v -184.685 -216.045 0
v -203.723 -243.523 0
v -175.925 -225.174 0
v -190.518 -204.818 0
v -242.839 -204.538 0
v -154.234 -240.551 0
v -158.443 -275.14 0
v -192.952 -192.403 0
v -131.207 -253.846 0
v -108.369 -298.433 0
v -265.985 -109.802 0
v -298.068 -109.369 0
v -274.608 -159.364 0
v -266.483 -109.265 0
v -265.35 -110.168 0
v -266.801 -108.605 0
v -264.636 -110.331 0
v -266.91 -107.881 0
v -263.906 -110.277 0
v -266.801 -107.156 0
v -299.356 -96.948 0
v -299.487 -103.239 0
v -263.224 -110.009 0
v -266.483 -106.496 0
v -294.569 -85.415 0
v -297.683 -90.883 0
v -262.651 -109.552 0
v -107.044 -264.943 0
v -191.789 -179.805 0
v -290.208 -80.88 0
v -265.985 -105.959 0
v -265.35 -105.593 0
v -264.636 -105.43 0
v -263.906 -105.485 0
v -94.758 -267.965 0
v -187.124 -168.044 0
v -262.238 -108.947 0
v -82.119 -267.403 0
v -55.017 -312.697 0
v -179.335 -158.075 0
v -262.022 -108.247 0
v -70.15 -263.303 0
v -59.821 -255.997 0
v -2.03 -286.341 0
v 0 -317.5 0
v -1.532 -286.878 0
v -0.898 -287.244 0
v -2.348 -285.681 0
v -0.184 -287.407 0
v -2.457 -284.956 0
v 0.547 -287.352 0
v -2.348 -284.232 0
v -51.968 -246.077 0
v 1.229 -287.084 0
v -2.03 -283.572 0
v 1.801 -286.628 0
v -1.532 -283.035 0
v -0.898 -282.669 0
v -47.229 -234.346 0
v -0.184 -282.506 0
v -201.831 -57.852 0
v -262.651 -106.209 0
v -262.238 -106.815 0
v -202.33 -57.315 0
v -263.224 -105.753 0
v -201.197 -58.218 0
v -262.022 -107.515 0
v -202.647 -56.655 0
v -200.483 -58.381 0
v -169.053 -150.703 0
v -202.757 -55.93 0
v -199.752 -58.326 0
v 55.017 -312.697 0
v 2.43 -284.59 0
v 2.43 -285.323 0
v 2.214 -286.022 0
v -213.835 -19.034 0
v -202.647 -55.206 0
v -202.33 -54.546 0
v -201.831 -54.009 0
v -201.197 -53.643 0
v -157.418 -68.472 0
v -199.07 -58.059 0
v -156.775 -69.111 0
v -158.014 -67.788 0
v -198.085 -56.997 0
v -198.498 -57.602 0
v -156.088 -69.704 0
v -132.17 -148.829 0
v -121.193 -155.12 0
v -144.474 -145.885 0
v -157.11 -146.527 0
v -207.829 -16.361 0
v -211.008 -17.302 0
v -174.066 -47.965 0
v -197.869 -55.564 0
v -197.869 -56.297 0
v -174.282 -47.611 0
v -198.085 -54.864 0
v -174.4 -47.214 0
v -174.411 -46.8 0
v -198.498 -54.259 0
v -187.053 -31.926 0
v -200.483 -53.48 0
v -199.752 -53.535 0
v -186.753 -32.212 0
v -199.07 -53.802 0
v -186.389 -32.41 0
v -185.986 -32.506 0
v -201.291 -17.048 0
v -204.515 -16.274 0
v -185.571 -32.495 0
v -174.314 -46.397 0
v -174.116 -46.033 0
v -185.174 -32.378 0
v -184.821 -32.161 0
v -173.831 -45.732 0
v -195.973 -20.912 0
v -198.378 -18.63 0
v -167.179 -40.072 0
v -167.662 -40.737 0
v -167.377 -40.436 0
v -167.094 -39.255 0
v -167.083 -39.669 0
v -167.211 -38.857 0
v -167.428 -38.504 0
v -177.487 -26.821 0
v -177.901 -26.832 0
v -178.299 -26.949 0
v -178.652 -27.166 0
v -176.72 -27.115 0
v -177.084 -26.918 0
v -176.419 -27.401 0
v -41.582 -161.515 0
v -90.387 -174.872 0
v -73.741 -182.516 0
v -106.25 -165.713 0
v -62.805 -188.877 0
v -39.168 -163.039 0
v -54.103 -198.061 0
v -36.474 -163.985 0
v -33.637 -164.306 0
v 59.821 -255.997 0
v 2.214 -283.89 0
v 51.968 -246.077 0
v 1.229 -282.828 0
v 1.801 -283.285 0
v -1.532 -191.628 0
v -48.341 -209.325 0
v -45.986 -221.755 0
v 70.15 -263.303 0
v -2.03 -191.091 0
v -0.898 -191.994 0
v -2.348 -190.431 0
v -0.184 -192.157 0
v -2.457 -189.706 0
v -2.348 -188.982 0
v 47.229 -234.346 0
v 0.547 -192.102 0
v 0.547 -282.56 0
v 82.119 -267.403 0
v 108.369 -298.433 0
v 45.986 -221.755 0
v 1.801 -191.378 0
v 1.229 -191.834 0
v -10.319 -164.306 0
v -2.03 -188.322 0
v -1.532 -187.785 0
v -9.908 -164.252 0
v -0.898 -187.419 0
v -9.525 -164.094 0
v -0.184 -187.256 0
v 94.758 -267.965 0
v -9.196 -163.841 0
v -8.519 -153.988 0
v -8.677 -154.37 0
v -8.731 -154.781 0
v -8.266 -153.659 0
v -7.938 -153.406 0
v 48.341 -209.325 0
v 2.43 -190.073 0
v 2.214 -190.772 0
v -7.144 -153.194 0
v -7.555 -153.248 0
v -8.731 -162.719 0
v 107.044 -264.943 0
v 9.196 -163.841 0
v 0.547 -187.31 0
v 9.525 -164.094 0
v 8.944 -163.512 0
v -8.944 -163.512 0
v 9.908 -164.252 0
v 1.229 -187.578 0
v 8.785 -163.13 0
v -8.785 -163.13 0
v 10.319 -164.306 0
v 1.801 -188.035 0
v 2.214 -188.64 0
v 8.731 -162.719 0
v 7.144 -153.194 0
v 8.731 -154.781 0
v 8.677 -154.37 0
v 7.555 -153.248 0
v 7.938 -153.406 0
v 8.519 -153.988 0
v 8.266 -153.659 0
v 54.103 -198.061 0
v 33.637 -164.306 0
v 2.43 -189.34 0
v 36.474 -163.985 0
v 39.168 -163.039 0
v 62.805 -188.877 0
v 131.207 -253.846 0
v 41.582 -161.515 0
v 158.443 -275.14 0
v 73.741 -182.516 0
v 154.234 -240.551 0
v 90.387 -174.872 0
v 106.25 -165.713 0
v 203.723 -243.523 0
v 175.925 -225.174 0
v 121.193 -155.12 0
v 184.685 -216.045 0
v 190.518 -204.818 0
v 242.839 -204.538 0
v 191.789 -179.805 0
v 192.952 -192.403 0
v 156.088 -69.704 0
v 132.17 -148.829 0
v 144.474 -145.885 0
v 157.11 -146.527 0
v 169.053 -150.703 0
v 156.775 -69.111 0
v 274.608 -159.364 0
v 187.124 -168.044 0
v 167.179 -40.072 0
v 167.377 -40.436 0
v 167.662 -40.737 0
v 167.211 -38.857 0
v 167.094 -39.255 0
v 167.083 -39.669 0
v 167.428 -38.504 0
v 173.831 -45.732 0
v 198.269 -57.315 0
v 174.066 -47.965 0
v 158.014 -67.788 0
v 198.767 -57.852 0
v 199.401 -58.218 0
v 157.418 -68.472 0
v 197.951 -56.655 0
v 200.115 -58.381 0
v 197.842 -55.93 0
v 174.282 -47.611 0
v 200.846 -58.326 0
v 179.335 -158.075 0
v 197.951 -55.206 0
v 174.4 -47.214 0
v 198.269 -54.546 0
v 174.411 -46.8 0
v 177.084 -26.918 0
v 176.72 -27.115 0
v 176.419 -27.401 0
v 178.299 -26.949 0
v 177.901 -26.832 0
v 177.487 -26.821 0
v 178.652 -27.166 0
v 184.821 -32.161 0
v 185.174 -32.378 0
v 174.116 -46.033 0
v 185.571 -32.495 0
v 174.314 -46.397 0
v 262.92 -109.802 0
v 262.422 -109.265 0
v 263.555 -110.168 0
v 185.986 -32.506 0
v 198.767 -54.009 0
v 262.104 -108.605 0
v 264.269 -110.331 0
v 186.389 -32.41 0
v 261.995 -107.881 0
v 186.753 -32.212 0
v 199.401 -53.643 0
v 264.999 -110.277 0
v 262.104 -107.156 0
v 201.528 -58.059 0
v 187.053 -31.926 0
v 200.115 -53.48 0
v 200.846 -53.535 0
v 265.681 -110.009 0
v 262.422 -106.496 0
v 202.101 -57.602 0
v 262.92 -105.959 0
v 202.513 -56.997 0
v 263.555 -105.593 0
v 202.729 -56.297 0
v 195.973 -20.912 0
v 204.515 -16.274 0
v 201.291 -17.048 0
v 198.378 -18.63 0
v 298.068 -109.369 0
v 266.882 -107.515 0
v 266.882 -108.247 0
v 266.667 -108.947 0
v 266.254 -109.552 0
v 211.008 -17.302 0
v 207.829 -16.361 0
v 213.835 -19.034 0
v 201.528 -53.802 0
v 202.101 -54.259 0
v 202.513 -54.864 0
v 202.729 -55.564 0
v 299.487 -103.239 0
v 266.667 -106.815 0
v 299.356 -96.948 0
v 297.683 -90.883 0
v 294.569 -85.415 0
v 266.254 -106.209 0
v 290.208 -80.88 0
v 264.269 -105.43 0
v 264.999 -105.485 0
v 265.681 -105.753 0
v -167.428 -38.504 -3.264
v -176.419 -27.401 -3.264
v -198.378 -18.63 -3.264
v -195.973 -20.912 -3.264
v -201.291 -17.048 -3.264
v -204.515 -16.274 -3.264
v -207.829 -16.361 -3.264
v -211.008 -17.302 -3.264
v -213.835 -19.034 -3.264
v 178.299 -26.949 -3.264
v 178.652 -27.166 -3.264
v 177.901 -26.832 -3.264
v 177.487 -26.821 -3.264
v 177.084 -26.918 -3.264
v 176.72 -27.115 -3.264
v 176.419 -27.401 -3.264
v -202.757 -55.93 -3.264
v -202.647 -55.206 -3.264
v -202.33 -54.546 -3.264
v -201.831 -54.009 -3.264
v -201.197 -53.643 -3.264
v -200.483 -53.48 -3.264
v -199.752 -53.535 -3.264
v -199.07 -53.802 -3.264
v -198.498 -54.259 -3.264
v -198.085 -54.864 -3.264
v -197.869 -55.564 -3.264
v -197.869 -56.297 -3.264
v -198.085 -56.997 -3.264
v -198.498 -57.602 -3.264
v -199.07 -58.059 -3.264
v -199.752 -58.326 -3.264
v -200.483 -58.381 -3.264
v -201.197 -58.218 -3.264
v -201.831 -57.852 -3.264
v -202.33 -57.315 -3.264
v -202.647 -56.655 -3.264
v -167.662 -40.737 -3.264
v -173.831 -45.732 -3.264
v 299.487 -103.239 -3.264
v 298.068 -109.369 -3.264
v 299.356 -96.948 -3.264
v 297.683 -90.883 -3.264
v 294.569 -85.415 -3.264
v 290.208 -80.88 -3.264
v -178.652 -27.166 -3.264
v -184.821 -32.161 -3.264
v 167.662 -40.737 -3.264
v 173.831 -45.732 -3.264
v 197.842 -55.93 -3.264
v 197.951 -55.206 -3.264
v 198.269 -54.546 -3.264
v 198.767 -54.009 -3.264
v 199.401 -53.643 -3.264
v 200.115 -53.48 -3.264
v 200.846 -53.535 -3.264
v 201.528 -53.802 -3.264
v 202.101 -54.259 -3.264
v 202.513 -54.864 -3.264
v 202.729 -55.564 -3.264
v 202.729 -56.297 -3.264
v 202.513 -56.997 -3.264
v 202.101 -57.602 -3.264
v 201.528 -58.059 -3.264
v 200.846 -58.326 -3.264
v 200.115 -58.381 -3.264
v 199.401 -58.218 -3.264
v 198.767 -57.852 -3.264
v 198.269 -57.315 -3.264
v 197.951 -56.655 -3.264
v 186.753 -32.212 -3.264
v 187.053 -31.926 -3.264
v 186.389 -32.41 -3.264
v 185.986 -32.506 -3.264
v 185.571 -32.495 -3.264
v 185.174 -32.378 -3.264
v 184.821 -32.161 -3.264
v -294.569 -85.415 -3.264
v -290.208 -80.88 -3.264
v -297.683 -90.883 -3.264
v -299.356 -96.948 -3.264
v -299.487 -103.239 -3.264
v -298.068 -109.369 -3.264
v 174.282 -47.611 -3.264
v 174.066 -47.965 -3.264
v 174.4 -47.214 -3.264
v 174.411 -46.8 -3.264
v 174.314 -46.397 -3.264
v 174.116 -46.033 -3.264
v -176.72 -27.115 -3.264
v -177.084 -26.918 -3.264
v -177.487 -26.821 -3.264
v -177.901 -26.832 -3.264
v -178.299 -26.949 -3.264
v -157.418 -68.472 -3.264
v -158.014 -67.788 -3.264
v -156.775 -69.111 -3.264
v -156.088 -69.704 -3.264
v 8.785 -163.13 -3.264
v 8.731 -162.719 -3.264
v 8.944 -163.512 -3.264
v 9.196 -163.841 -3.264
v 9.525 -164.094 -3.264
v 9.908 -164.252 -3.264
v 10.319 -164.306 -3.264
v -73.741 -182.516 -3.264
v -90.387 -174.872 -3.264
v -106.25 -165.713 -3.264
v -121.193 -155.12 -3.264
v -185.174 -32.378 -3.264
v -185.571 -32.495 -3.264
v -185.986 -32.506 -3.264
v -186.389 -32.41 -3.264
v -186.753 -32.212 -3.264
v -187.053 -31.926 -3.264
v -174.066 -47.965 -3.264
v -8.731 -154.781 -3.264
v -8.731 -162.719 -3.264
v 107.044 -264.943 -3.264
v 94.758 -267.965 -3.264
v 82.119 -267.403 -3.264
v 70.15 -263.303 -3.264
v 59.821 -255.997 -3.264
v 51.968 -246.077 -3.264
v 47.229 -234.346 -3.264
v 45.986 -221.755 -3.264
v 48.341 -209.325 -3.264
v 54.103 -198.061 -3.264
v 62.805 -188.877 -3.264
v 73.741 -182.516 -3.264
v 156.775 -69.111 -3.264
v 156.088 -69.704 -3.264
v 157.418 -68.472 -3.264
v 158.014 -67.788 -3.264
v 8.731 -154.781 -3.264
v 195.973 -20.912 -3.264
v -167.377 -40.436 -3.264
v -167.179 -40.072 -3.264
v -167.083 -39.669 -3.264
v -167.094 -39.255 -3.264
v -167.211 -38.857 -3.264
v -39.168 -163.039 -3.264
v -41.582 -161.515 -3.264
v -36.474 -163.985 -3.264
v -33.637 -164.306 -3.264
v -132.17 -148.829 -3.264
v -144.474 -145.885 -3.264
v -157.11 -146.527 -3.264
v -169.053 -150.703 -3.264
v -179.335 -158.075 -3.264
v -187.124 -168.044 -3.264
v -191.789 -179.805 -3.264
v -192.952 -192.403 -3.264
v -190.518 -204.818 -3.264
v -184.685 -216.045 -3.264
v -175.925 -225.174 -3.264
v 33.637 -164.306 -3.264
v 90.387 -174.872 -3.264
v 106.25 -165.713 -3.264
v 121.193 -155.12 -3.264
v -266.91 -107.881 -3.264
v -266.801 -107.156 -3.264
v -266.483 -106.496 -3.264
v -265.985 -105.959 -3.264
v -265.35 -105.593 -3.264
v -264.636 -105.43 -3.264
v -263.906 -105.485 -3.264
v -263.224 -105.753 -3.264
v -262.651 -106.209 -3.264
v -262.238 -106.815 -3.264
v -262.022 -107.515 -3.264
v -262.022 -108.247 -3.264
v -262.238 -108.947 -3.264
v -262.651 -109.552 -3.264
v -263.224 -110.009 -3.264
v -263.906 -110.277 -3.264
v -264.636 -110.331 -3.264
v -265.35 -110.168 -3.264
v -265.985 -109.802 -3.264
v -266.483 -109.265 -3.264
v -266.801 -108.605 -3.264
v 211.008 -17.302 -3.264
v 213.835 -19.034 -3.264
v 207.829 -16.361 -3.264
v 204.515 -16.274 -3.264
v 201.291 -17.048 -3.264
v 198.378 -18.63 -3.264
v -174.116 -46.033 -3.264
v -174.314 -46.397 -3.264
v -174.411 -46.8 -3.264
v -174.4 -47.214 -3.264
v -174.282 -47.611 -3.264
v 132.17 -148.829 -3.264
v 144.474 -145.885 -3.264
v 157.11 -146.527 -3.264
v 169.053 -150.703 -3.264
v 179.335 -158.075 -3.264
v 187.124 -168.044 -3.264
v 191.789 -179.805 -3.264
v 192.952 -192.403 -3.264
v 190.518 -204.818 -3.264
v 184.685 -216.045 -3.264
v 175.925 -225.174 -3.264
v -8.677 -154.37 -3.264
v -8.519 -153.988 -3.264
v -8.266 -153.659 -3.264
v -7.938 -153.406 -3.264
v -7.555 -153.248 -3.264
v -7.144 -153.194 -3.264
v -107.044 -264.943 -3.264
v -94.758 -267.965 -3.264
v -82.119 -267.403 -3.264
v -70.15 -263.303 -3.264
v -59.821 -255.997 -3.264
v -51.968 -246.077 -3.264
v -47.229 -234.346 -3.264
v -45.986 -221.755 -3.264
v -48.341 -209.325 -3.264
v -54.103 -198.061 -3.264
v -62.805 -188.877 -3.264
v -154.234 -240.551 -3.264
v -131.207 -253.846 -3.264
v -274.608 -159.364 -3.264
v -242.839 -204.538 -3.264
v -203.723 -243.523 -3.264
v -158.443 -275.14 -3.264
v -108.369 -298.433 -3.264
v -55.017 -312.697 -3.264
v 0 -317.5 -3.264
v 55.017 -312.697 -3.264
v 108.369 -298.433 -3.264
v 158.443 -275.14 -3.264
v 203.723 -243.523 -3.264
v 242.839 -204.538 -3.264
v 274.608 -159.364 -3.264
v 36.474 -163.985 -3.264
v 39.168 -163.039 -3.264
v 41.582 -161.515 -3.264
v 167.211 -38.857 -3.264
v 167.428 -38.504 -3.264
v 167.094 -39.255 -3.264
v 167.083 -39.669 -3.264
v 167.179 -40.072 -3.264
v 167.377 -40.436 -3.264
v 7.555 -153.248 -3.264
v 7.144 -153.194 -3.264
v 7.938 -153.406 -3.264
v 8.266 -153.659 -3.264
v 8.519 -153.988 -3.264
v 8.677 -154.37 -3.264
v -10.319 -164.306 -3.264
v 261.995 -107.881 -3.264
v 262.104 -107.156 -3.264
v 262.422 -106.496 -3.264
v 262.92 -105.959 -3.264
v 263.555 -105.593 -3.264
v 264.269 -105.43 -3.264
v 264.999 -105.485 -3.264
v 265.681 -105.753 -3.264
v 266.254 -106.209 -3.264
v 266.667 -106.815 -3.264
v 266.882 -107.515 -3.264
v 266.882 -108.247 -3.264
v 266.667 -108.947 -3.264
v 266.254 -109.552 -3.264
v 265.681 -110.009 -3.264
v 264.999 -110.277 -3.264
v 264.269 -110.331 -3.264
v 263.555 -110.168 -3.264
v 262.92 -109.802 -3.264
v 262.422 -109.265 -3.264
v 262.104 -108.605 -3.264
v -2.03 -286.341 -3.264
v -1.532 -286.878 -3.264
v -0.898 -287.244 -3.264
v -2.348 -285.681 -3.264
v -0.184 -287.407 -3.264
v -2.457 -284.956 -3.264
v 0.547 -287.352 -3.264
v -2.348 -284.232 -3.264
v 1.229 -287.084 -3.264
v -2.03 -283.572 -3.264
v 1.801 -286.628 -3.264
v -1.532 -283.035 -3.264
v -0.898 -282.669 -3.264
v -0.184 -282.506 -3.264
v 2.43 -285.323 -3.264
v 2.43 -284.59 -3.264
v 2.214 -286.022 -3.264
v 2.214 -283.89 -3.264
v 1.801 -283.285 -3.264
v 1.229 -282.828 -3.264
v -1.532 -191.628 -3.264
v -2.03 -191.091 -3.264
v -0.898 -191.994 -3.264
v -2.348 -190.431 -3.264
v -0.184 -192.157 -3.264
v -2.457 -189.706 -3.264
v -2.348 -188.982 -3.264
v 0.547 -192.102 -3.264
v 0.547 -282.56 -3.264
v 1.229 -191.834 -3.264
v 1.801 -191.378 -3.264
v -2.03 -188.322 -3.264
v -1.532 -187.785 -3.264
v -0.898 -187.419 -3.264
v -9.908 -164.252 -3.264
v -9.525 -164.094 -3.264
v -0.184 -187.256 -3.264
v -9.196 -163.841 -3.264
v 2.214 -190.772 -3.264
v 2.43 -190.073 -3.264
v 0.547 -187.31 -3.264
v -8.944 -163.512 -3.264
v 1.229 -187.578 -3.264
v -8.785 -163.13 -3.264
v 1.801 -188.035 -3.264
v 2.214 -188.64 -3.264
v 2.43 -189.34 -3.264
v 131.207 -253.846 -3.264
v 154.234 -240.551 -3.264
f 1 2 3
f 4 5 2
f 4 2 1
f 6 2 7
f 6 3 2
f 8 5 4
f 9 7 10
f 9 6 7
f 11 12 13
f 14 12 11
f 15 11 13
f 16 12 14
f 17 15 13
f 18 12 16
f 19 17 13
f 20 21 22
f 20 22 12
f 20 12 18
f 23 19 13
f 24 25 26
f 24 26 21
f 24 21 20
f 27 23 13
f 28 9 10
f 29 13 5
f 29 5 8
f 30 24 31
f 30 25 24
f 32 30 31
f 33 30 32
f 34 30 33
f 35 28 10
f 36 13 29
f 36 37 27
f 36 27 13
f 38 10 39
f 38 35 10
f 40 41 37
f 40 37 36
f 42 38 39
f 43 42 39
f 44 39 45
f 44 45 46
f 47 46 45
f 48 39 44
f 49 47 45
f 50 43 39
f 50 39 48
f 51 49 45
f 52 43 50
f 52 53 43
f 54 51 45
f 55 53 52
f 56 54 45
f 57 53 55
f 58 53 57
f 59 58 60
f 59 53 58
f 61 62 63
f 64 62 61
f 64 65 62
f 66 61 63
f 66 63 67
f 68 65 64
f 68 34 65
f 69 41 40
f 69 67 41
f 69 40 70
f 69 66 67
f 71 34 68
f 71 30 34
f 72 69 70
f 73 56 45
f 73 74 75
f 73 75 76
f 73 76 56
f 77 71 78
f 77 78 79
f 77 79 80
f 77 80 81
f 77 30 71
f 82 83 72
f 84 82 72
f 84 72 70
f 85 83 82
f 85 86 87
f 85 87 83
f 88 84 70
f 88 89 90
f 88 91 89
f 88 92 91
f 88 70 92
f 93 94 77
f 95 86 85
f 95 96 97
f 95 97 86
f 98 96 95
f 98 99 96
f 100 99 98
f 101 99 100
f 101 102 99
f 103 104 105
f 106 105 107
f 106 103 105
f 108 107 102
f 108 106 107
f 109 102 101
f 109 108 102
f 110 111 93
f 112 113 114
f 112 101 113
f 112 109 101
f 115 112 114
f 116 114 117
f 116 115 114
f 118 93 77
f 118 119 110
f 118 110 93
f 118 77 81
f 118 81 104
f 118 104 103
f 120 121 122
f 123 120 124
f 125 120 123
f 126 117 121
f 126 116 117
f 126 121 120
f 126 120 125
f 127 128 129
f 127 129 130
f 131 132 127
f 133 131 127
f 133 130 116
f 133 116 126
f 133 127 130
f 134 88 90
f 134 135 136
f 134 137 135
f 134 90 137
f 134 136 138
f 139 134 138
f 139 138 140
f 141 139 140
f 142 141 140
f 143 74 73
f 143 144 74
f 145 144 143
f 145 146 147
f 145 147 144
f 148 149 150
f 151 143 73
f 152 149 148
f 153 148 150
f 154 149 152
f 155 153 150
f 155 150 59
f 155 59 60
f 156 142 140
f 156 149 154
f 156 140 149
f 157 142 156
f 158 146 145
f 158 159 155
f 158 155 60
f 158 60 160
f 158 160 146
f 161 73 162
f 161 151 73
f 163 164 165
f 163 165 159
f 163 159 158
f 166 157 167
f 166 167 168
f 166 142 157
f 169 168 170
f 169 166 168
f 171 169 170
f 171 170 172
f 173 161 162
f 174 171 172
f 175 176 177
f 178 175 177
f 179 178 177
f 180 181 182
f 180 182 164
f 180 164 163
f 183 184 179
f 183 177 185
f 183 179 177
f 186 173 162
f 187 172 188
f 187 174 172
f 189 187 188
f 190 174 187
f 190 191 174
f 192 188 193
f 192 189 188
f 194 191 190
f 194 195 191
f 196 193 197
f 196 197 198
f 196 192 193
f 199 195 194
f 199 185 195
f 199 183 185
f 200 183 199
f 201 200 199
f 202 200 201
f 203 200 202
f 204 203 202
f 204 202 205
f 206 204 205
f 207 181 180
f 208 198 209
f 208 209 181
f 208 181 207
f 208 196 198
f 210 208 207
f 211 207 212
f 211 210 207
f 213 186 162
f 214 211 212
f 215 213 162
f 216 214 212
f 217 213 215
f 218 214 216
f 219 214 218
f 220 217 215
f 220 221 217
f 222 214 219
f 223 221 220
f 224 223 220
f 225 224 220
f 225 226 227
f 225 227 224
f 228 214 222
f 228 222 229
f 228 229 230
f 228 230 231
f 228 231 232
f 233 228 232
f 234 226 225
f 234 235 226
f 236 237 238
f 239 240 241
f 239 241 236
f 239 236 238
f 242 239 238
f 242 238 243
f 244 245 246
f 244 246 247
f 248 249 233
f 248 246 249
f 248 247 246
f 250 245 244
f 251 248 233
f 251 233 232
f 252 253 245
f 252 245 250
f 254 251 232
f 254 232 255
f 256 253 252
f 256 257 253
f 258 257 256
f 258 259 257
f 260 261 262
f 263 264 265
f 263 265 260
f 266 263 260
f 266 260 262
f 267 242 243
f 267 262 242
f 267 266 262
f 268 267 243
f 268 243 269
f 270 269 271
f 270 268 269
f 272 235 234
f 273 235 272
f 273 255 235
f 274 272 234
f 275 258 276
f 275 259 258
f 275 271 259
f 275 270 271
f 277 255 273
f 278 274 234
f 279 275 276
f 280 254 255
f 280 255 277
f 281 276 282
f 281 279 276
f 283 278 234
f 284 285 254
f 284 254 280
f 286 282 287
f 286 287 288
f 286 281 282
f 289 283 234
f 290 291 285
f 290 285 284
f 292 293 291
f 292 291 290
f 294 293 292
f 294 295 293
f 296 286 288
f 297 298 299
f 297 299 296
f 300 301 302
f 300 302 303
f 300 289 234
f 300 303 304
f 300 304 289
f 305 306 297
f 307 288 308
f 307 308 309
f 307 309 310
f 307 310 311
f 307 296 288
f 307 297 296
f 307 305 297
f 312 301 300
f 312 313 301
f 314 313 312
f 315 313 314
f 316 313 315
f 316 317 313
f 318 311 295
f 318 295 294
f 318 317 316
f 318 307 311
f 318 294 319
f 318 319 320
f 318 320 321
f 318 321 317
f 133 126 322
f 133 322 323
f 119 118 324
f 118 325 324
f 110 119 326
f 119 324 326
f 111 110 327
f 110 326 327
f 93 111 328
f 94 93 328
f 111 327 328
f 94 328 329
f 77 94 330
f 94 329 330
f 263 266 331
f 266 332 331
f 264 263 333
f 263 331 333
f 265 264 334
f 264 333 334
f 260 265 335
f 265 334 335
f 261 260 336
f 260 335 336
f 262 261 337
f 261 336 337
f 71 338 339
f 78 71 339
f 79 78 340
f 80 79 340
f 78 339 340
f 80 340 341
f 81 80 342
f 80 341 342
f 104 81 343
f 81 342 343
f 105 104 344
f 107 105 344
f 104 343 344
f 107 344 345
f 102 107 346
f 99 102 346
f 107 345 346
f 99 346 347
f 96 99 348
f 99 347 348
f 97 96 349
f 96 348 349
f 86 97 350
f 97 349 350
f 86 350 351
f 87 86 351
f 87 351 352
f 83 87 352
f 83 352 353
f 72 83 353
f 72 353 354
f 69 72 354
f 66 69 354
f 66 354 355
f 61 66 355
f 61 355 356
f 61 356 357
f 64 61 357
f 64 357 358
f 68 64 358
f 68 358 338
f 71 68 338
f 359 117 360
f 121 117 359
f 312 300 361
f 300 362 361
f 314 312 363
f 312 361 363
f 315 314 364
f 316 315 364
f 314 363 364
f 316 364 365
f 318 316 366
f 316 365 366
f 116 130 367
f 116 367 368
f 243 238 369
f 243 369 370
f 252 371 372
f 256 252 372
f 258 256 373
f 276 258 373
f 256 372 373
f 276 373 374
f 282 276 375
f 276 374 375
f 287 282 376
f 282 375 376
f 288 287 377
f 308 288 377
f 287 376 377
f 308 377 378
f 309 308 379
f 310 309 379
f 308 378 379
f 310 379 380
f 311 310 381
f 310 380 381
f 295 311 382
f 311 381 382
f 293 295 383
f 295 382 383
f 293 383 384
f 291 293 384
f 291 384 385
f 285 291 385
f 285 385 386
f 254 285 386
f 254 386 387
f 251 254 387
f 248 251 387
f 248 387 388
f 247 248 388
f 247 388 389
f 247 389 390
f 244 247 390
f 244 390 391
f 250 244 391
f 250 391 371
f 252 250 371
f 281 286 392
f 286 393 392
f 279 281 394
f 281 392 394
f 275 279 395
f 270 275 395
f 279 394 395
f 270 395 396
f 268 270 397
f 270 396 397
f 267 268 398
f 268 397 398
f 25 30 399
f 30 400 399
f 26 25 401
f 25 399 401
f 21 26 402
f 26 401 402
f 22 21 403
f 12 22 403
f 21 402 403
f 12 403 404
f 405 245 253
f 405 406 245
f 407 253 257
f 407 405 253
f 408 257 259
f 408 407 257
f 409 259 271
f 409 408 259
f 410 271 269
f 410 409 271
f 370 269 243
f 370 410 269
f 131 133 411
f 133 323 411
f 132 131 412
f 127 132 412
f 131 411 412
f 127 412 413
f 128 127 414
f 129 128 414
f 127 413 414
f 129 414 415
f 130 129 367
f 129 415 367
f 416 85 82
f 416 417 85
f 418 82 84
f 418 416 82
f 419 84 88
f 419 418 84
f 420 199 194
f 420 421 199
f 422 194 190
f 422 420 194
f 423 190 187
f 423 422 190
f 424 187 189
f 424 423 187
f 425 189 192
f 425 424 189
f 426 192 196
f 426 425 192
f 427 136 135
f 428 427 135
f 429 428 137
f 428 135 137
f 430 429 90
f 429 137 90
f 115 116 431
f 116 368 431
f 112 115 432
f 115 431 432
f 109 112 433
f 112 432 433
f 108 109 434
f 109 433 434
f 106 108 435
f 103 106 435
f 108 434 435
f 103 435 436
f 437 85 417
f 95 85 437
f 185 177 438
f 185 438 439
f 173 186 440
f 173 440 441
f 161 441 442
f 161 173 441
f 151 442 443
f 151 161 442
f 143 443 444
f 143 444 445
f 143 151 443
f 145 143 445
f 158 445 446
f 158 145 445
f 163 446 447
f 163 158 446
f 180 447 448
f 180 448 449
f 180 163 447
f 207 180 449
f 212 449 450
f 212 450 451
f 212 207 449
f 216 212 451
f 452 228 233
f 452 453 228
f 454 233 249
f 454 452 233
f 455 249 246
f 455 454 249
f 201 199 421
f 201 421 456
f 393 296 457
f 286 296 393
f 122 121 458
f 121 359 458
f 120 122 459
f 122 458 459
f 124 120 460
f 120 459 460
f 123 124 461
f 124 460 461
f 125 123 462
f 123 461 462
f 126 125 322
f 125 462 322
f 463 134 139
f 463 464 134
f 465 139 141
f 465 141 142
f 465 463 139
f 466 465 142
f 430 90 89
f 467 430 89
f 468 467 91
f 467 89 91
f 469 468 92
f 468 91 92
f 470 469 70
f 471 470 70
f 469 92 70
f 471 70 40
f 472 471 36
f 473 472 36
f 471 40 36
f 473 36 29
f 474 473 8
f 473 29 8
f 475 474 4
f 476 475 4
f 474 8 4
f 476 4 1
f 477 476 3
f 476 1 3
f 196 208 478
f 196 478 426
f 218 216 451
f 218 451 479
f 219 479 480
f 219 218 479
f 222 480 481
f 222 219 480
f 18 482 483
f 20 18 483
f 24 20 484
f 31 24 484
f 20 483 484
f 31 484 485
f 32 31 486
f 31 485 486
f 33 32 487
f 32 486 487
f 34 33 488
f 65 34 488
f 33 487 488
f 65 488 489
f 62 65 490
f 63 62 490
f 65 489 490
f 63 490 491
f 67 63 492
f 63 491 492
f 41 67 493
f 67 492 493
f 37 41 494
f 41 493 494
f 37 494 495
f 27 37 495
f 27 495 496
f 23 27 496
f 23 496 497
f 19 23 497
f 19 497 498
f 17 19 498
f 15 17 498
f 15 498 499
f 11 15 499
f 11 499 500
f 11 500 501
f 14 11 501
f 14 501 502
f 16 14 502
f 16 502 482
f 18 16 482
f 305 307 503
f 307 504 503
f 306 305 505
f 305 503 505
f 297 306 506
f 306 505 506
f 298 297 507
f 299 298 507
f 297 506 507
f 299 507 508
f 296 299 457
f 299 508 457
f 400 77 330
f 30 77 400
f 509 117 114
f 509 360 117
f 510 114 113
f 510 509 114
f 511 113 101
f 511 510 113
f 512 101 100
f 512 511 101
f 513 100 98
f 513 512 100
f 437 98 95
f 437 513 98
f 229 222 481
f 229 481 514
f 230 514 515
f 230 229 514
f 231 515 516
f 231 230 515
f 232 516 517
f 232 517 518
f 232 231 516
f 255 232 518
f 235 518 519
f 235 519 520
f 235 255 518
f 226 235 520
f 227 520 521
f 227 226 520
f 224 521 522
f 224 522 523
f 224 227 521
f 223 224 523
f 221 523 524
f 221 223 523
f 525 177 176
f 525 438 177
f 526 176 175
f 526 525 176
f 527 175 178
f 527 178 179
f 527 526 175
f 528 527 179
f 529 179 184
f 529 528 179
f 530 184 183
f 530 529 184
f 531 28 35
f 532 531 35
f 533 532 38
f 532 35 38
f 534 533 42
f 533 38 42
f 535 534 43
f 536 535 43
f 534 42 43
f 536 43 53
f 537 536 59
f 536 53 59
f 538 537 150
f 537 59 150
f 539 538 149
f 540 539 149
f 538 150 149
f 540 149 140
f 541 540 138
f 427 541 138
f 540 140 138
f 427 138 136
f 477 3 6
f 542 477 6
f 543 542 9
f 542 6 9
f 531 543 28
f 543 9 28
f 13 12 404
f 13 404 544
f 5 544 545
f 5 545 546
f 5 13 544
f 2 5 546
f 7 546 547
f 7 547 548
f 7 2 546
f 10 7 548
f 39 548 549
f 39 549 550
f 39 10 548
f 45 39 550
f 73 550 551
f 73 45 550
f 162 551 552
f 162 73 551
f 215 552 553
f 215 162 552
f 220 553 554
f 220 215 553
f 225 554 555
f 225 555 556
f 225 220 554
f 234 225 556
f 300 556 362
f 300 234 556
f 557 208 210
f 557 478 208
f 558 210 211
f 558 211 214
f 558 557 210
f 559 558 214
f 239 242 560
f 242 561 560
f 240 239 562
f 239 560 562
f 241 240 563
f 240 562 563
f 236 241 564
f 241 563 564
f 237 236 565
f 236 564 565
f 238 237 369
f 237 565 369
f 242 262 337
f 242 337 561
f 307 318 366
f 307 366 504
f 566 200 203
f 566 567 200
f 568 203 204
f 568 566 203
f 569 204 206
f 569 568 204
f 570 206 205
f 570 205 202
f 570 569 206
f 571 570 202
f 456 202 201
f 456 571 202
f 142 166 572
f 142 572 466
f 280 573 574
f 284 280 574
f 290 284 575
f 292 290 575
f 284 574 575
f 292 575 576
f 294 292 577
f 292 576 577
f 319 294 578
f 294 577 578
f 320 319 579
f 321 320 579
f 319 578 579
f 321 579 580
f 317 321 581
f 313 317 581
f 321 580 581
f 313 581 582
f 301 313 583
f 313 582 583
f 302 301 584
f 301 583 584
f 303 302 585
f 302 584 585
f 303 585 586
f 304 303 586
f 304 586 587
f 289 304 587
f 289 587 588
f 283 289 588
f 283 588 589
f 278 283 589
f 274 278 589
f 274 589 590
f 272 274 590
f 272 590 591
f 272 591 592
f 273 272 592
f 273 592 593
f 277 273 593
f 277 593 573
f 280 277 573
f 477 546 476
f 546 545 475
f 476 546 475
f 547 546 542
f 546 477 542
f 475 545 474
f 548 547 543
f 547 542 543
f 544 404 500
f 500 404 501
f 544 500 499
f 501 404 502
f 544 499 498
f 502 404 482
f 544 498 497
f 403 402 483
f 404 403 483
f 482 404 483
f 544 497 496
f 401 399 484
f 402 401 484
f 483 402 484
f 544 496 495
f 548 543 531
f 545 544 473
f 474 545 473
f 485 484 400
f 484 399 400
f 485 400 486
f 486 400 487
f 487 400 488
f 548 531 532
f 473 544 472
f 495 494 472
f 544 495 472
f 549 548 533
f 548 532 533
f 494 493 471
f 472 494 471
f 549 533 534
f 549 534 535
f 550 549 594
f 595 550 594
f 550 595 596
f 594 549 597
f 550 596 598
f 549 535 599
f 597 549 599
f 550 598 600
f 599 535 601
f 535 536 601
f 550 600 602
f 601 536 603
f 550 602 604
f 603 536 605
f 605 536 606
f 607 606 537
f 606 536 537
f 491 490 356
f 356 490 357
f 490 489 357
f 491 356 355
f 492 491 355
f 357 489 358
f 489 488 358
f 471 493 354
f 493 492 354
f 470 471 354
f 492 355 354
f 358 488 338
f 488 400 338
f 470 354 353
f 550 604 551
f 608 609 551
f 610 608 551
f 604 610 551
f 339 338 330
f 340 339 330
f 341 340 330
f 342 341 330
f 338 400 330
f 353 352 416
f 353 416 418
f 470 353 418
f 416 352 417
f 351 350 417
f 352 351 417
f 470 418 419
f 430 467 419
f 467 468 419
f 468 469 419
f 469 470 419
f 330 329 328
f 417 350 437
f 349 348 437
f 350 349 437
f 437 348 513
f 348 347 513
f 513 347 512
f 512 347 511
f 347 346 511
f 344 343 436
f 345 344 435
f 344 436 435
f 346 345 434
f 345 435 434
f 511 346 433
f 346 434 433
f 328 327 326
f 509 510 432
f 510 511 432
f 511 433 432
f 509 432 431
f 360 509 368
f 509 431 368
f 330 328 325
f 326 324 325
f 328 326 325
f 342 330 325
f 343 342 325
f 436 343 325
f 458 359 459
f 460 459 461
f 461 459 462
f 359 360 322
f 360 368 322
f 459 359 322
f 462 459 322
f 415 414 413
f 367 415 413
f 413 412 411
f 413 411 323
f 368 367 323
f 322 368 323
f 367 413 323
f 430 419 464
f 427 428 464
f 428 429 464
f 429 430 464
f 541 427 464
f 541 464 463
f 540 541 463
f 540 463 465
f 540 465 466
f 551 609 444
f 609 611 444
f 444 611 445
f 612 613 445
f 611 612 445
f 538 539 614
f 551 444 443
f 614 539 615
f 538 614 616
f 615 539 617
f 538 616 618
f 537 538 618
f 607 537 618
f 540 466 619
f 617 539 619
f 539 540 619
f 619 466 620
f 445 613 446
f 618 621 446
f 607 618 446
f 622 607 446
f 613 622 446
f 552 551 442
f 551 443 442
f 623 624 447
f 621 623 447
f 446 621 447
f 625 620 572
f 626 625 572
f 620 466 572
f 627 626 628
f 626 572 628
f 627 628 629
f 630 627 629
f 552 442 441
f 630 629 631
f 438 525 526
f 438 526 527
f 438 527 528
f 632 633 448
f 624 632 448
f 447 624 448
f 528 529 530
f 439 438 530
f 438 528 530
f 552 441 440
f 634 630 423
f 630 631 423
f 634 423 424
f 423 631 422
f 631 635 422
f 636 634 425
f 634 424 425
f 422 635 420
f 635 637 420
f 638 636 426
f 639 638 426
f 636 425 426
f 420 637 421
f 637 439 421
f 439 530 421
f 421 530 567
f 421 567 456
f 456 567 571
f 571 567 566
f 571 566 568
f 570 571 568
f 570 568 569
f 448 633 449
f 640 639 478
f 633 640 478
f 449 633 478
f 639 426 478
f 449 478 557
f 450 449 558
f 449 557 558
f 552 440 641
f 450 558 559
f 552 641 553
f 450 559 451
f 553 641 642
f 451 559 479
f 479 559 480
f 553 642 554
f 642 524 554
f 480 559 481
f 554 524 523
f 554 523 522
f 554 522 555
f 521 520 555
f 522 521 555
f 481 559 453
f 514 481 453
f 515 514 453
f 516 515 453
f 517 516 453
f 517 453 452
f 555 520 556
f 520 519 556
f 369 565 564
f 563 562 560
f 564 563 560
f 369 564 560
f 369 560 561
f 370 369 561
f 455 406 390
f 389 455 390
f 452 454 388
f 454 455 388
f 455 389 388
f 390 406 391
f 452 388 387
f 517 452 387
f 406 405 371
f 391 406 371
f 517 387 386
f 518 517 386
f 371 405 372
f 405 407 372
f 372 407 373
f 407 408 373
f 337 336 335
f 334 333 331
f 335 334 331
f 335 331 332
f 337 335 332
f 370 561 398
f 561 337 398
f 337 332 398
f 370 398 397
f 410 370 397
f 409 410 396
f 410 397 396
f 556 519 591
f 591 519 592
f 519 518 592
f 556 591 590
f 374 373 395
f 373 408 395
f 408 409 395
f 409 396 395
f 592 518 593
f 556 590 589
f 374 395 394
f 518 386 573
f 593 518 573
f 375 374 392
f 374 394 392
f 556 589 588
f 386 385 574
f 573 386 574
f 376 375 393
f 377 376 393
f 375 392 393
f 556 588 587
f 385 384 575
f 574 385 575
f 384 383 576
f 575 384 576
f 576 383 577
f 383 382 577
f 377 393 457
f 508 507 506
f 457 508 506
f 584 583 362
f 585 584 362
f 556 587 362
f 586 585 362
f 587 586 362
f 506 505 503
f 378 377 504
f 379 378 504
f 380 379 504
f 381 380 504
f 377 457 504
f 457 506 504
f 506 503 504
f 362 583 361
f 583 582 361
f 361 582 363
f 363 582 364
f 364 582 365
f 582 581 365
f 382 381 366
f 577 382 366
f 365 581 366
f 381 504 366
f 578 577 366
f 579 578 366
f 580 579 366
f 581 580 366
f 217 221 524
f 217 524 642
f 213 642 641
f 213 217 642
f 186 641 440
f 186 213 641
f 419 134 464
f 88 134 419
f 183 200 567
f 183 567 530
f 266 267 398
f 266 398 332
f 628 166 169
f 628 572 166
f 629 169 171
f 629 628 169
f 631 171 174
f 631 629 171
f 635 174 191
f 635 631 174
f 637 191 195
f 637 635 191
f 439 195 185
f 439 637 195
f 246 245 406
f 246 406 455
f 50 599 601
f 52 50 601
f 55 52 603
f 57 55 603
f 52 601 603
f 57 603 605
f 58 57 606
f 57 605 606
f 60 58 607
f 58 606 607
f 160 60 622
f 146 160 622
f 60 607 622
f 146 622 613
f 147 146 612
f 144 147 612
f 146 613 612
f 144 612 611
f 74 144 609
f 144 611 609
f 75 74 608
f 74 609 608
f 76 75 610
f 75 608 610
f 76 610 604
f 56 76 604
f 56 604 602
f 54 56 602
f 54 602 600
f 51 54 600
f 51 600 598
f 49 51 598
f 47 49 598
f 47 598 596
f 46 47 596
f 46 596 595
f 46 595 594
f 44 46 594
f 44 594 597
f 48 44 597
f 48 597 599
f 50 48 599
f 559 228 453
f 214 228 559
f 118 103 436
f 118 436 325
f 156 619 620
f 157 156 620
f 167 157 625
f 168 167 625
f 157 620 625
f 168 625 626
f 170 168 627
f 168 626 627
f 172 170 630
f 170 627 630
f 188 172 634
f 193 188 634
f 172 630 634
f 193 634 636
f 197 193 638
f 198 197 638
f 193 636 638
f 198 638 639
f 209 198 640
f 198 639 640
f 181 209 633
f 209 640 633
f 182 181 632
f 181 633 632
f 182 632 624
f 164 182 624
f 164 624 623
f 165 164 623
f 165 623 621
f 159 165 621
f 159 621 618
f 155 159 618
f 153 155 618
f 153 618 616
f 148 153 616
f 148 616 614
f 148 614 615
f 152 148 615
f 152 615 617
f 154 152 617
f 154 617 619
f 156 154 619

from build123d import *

# Parameters (mm, degrees)
BASE_FLANGE1_DEPTH           = 3.2639
F_10_0_1935_DIAMETER_HOLE1_D = 4.9149
FILLET1_R                    = 1.5875
FILLET2_R                    = 12.7
FILLET3_R                    = 25.4


# Sheet-metal steps are written as plain solids
with BuildPart() as part:
    # Sketch1 → Base-Flange1 (new body)
    with BuildSketch(Plane.XY):
        with BuildLine():
            Line((-175.064802987, -46.731119967), (-166.42876849, -39.737797122))
            Line((-166.42876849, -39.737797122), (-177.418275819, -26.16688577))
            Line((-177.418275819, -26.16688577), (-186.054310315, -33.160208616))
            Line((-186.054310315, -33.160208616), (-203.965209169, -11.04209055))
            Line((-203.965209169, -11.04209055), (-303.890728914, -91.960180949))
            ThreePointArc((-303.890728914, -91.960180949), (0, -317.5), (303.890728914, -91.960180949))
            Line((303.890728914, -91.960180949), (203.965209169, -11.04209055))
            Line((203.965209169, -11.04209055), (186.054310315, -33.160208616))
            Line((186.054310315, -33.160208616), (177.418275819, -26.16688577))
            Line((177.418275819, -26.16688577), (166.42876849, -39.737797122))
            Line((166.42876849, -39.737797122), (175.064802987, -46.731119967))
            Line((175.064802987, -46.731119967), (157.153904133, -68.849238033))
            Line((157.153904133, -68.849238033), (38.1, -164.30625))
            Line((38.1, -164.30625), (8.73125, -164.30625))
            Line((8.73125, -164.30625), (8.73125, -153.19375))
            Line((8.73125, -153.19375), (-8.73125, -153.19375))
            Line((-8.73125, -153.19375), (-8.73125, -164.30625))
            Line((-8.73125, -164.30625), (-38.1, -164.30625))
            Line((-38.1, -164.30625), (-157.153904133, -68.849238033))
            Line((-157.153904133, -68.849238033), (-175.064802987, -46.731119967))
        make_face()
        with BuildLine():
            ThreePointArc((-175.925266574, -225.174072843), (-142.875, -247.466759131), (-107.043834069, -264.942786442))
            ThreePointArc((-107.043834069, -264.942786442), (-49.179248656, -240.380727184), (-73.741307914, -182.516141771))
            ThreePointArc((-73.741307914, -182.516141771), (-98.425, -170.477100735), (-121.192961418, -155.119916847))
            ThreePointArc((-121.192961418, -155.119916847), (-183.586191994, -162.780842267), (-175.925266574, -225.174072843))
        make_face(mode=Mode.SUBTRACT)
        with BuildLine():
            ThreePointArc((175.925266574, -225.174072843), (142.875, -247.466759131), (107.043834069, -264.942786442))
            ThreePointArc((107.043834069, -264.942786442), (49.179248656, -240.380727184), (73.741307914, -182.516141771))
            ThreePointArc((73.741307914, -182.516141771), (98.425, -170.477100735), (121.192961418, -155.119916847))
            ThreePointArc((121.192961418, -155.119916847), (183.586191994, -162.780842267), (175.925266574, -225.174072843))
        make_face(mode=Mode.SUBTRACT)
    extrude(amount=-BASE_FLANGE1_DEPTH)

    # #10 (0.1935) Diameter Hole1 (through all)
    with Locations(Plane.XY):
        with Locations((-200.299064072, -55.930402224), (-264.45246319, -107.880800505), (0, -189.70625), (0, -284.95625), (200.299064072, -55.930402224), (264.45246319, -107.880800505)):
            Hole(F_10_0_1935_DIAMETER_HOLE1_D / 2)

    # Fillet1
    fillet1_edges = [part.edges().sort_by_distance(p)[0] for p in [
        (-8.73125, -164.30625, -1.63195),
        (-8.73125, -153.19375, -1.63195),
        (8.73125, -153.19375, -1.63195),
        (8.73125, -164.30625, -1.63195),
        (175.064802987, -46.731119967, -1.63195),
        (166.42876849, -39.737797122, -1.63195),
        (177.418275819, -26.16688577, -1.63195),
        (186.054310315, -33.160208616, -1.63195),
        (-186.054310315, -33.160208616, -1.63195),
        (-177.418275819, -26.16688577, -1.63195),
        (-166.42876849, -39.737797122, -1.63195),
        (-175.064802987, -46.731119967, -1.63195),
    ]]
    fillet(fillet1_edges, radius=FILLET1_R)

    # Fillet2
    fillet2_edges = [part.edges().sort_by_distance(p)[0] for p in [
        (-38.1, -164.30625, -1.63195),
        (38.1, -164.30625, -1.63195),
        (157.153904133, -68.849238033, -1.63195),
        (203.965209169, -11.04209055, -1.63195),
        (-203.965209169, -11.04209055, -1.63195),
        (-157.153904133, -68.849238033, -1.63195),
    ]]
    fillet(fillet2_edges, radius=FILLET2_R)

    # Fillet3
    fillet3_edges = [part.edges().sort_by_distance(p)[0] for p in [
        (303.890728914, -91.960180949, -1.63195),
        (-303.890728914, -91.960180949, -1.63195),
    ]]
    fillet(fillet3_edges, radius=FILLET3_R)


solid = part.part
